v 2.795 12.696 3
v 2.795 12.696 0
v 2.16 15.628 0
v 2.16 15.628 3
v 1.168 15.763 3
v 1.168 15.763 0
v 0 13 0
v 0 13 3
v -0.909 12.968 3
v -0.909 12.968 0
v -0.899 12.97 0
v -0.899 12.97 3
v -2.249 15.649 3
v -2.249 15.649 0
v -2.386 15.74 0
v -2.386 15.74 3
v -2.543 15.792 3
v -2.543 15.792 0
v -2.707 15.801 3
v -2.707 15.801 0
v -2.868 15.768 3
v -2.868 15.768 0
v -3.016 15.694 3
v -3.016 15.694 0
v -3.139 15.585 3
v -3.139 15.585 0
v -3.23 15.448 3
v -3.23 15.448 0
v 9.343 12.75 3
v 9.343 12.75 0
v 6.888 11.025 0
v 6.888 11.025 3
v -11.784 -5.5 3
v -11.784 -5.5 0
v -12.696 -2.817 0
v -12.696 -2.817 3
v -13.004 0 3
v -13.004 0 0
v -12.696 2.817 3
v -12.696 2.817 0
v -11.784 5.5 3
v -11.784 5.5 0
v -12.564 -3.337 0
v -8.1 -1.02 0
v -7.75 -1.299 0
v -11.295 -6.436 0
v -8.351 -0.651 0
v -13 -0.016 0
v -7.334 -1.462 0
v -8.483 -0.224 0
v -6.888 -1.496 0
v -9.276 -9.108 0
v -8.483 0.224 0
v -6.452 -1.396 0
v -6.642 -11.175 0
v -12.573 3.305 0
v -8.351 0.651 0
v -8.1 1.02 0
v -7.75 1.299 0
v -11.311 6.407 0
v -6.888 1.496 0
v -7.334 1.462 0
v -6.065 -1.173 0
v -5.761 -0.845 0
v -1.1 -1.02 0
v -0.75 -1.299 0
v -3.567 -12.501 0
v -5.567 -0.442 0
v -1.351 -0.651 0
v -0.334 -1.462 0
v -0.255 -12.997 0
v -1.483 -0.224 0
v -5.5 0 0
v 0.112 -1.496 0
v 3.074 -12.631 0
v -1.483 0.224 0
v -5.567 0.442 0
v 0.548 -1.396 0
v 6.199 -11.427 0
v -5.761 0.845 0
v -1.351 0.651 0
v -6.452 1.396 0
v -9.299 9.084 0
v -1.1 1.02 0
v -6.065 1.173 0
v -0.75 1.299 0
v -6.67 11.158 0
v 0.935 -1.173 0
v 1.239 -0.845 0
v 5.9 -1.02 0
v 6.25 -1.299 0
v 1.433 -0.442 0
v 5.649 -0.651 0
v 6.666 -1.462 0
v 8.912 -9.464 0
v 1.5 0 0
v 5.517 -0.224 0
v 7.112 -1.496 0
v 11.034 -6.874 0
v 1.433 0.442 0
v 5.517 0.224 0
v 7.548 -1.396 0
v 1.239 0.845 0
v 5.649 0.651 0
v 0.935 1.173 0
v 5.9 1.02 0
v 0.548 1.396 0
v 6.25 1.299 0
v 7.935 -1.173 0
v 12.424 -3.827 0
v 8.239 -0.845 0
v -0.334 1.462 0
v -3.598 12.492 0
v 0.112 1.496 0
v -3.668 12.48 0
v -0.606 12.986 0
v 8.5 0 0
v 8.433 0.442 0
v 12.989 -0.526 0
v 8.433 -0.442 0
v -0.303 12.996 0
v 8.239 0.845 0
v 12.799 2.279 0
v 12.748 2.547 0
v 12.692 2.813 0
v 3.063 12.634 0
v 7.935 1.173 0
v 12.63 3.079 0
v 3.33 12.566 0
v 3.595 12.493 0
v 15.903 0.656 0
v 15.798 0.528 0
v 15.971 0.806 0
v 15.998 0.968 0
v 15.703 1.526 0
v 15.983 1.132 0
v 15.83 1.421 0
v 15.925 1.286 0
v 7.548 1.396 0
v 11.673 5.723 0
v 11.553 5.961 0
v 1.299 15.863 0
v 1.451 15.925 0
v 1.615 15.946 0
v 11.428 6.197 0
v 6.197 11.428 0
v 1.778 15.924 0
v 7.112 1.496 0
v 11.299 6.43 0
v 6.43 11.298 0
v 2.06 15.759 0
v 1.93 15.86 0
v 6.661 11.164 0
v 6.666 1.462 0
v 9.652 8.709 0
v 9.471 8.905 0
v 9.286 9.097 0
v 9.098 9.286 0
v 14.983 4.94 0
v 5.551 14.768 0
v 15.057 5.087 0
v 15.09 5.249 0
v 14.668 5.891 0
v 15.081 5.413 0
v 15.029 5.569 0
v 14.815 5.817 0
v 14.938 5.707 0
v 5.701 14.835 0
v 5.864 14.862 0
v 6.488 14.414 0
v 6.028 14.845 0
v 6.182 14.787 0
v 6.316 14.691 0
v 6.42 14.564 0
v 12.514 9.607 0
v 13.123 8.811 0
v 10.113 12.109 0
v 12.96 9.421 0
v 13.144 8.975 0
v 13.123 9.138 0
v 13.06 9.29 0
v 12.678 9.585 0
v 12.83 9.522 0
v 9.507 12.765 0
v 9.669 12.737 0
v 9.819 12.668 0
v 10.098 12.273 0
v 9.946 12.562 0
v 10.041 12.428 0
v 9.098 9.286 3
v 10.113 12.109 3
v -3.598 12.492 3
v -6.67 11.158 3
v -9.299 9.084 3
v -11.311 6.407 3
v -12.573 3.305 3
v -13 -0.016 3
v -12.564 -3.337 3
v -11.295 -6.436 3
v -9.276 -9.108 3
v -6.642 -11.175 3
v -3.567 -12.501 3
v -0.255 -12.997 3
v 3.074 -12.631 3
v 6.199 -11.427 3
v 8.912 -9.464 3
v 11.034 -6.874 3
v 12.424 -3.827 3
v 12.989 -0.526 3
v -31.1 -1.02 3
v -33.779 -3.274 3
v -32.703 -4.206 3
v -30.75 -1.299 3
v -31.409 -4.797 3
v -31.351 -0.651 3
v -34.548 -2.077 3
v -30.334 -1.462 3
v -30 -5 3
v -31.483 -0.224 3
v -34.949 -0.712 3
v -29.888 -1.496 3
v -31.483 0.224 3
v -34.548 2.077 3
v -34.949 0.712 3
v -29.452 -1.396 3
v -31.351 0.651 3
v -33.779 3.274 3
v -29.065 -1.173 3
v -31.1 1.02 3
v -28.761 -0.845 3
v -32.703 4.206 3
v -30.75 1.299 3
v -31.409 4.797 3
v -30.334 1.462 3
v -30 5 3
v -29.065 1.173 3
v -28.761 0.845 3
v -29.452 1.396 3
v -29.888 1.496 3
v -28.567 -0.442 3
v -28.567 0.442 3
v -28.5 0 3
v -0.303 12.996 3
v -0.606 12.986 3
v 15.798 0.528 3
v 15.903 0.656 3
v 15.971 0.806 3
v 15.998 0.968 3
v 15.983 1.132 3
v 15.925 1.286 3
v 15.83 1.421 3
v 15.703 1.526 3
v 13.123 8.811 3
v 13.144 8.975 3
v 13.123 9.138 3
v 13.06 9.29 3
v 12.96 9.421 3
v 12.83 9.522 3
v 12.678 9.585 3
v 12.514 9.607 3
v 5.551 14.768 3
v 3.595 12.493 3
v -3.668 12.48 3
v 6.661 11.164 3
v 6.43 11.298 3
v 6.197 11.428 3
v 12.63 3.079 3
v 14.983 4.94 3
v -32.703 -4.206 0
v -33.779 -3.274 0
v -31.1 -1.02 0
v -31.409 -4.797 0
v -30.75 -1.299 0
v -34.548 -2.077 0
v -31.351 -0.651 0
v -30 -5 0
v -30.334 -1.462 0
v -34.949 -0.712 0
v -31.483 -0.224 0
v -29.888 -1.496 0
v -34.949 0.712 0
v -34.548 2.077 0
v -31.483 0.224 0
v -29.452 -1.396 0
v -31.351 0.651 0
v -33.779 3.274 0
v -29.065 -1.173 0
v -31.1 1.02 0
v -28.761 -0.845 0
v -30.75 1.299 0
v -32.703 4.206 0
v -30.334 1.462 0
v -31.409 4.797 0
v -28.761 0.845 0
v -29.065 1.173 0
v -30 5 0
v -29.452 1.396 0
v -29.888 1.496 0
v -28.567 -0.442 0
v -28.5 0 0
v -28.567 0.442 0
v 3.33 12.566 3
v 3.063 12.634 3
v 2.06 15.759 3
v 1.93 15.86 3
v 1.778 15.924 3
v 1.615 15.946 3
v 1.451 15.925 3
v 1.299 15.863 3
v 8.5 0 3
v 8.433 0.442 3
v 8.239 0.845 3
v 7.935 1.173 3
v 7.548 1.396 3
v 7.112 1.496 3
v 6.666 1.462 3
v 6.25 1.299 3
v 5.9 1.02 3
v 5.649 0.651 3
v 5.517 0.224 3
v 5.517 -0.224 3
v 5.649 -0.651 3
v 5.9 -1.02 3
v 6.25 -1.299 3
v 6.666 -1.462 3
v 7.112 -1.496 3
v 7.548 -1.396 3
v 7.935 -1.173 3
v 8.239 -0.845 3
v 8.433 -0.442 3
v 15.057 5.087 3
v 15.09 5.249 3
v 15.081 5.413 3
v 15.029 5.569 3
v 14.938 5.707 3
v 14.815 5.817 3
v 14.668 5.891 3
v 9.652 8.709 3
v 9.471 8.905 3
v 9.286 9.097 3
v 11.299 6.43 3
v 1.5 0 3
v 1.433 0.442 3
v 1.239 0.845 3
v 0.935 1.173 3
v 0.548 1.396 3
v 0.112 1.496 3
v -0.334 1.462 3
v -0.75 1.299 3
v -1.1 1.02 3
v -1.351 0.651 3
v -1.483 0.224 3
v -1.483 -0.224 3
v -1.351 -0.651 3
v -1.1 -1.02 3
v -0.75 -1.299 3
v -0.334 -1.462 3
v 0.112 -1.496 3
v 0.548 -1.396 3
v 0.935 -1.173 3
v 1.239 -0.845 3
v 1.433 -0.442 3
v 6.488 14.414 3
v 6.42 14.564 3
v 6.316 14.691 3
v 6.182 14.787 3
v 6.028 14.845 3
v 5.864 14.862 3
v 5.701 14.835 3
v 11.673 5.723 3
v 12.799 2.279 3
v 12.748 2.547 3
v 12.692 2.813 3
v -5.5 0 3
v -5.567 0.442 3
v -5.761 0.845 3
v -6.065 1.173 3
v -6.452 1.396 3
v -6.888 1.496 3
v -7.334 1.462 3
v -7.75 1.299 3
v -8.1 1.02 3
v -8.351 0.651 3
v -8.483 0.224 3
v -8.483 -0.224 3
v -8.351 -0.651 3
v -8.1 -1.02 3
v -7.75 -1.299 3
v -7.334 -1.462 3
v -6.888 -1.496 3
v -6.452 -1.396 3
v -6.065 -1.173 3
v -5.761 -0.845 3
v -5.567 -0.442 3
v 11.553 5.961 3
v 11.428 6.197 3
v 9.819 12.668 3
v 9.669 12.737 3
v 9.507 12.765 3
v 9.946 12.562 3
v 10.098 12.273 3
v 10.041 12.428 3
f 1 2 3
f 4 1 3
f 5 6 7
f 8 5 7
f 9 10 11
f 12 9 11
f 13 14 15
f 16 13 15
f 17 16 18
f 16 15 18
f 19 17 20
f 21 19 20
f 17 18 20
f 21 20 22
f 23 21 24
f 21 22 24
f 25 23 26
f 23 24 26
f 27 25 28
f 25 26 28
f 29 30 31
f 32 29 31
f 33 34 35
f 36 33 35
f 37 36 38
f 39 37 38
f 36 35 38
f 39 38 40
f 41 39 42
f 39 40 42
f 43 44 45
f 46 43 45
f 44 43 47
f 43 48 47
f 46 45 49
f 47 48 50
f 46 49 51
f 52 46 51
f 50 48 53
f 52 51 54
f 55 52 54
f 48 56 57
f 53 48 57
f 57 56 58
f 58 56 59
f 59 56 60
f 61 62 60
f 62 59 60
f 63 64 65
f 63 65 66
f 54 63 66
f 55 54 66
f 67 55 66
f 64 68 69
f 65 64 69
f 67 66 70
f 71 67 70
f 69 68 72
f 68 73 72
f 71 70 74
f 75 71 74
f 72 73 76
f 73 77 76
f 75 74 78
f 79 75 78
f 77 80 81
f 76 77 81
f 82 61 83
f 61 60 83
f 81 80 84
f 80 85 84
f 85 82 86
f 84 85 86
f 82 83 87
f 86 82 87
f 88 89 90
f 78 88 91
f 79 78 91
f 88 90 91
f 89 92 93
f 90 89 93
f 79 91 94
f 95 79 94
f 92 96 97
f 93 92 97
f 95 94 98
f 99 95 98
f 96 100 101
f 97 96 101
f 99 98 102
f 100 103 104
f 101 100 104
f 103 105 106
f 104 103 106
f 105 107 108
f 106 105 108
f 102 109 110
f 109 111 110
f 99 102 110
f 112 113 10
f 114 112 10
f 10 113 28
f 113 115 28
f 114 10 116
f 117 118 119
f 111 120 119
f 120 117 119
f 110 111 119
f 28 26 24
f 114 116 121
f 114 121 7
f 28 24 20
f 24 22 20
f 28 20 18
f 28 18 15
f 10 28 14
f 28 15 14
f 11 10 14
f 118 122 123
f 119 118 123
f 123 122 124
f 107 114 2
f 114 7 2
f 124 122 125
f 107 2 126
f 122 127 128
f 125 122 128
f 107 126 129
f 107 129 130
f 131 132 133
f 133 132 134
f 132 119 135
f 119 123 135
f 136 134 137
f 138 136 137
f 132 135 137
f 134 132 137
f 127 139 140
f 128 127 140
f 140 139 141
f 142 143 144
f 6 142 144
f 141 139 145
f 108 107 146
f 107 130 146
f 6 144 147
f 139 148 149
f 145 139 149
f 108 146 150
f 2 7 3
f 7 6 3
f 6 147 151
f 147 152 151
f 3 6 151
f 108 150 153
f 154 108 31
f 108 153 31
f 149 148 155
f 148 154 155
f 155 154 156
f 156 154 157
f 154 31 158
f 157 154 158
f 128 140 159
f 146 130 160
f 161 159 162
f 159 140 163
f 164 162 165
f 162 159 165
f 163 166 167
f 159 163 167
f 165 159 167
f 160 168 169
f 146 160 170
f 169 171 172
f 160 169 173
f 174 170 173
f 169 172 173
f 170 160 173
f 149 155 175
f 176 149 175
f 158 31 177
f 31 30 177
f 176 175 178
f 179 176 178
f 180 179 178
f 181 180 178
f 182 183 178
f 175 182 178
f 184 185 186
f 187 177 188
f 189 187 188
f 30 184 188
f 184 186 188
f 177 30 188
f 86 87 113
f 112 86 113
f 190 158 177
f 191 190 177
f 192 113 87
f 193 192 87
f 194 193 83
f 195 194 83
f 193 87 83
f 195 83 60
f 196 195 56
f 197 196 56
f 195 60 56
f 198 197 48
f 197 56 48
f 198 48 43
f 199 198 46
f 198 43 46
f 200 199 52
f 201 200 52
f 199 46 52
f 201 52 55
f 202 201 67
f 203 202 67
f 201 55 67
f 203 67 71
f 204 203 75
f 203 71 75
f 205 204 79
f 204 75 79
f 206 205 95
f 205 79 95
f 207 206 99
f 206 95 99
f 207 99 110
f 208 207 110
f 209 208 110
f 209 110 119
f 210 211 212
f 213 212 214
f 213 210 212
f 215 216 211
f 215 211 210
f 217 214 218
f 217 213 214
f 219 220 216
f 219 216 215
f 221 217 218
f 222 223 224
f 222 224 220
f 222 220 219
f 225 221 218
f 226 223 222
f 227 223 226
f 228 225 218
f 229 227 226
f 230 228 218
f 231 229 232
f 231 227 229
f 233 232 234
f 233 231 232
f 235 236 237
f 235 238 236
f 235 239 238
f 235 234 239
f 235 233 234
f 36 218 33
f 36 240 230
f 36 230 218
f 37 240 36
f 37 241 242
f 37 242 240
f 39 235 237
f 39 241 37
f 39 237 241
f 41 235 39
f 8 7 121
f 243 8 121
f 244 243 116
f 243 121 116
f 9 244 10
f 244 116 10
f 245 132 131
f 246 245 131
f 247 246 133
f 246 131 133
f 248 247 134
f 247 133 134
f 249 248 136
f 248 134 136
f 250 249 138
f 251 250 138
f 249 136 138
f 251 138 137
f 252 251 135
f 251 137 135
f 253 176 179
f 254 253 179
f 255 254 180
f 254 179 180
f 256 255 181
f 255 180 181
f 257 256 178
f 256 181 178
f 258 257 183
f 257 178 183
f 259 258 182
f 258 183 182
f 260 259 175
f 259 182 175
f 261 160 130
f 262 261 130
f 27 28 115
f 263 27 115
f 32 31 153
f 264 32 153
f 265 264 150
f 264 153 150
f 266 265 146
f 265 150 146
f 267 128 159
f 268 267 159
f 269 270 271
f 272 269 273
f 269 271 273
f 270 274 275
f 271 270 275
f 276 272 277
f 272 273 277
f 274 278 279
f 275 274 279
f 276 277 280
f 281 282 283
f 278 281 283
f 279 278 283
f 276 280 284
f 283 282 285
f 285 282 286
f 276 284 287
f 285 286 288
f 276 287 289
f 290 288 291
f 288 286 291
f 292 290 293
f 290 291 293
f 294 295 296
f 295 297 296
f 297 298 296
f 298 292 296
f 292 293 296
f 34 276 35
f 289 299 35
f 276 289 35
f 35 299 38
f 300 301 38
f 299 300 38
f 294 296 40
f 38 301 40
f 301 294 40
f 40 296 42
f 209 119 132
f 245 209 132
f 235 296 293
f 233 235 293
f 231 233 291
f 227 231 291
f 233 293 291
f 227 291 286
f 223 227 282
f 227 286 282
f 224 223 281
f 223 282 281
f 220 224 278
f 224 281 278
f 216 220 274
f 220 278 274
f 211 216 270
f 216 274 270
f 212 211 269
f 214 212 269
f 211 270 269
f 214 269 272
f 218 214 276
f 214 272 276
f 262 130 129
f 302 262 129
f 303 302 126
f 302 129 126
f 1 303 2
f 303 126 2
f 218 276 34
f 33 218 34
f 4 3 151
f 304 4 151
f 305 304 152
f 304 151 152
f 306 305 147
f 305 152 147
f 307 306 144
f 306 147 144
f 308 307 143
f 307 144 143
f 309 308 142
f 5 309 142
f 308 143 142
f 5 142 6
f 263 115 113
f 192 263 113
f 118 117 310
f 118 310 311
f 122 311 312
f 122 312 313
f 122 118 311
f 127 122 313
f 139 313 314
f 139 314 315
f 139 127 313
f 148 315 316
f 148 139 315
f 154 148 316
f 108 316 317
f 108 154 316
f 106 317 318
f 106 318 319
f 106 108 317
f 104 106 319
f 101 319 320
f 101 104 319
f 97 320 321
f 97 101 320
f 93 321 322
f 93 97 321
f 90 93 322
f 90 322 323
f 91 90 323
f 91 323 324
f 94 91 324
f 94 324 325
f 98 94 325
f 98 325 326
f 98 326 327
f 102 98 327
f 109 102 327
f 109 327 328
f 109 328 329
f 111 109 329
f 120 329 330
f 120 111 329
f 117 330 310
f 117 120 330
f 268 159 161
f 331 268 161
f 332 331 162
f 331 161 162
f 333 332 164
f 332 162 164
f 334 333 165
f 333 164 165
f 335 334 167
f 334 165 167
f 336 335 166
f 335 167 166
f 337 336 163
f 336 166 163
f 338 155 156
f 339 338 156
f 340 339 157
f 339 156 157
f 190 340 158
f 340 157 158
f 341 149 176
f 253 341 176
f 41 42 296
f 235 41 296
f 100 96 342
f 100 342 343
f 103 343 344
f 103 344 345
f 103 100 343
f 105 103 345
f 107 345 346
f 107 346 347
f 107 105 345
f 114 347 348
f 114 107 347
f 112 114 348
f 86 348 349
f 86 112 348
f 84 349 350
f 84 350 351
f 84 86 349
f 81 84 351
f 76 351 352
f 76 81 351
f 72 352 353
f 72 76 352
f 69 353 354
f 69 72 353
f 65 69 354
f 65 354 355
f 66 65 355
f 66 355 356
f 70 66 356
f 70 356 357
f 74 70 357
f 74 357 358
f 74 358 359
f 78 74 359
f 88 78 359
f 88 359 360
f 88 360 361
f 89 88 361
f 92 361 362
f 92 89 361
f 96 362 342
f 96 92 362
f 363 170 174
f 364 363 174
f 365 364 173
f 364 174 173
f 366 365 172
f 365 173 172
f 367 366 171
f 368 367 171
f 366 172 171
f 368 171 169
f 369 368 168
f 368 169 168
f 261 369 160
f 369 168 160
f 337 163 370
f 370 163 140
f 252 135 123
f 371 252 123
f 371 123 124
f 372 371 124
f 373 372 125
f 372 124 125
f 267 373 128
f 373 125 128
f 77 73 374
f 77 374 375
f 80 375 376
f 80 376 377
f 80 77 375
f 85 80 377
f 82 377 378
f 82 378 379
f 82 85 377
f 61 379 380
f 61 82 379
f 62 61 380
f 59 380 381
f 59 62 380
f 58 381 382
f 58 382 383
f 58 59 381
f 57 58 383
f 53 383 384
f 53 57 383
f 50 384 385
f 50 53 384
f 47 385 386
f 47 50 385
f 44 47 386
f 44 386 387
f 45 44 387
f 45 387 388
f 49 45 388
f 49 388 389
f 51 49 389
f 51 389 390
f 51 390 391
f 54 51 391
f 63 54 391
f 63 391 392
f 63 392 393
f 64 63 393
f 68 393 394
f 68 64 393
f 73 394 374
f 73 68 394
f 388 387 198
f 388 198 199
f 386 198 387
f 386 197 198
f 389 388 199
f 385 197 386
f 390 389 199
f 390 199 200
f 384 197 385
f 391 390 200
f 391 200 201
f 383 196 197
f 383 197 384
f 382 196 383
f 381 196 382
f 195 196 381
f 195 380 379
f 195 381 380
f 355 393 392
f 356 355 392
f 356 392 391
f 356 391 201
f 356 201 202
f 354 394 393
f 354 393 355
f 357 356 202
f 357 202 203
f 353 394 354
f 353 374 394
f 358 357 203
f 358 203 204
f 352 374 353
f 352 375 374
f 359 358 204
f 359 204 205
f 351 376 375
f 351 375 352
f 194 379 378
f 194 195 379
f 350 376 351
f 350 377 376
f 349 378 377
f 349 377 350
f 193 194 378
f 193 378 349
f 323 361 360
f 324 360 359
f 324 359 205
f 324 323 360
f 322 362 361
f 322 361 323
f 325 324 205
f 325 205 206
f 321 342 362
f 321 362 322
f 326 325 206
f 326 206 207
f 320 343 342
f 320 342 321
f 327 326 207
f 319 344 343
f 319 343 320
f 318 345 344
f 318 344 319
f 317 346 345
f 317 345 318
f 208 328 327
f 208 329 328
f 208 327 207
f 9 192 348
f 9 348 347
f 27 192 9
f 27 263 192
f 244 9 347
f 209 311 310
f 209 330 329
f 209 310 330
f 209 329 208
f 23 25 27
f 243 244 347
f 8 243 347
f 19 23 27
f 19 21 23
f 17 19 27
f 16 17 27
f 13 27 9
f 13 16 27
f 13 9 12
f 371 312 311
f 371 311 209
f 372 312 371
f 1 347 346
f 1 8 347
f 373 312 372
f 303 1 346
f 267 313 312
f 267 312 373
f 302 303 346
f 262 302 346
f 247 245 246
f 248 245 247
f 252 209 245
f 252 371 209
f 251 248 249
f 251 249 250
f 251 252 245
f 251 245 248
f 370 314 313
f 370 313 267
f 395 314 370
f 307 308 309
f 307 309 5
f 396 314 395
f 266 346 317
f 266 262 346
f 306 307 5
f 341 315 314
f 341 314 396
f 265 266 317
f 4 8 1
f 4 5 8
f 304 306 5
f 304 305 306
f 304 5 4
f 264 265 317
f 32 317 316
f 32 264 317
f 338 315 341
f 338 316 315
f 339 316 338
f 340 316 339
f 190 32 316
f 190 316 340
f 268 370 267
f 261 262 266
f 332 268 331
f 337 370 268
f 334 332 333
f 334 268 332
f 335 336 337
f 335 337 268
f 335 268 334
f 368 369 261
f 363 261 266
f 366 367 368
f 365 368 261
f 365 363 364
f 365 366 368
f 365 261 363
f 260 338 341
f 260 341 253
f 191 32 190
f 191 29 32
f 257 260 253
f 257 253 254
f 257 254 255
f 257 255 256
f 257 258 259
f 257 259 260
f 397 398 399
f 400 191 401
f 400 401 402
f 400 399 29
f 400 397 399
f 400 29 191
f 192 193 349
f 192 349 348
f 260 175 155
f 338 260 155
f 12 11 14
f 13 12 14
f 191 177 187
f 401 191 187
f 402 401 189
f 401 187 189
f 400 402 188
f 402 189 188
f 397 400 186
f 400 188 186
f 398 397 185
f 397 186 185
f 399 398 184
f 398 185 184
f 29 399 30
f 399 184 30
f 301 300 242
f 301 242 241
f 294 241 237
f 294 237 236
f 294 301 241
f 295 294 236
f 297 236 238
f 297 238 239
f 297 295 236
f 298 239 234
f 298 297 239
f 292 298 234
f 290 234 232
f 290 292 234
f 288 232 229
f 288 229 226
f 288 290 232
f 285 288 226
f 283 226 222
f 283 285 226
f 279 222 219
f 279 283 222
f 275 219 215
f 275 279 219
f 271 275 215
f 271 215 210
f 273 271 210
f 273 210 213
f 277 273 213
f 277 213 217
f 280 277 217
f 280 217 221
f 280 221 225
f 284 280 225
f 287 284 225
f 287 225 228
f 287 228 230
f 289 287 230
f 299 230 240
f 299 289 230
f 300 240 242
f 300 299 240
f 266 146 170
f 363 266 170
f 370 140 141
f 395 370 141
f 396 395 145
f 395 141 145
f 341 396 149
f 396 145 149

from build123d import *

# Parameters (mm, degrees)
SCHIZZO1_R                   = 13
SCHIZZO1_R_2                 = 1.5
ESTRUSIONE_ESTRUSIONE1_DEPTH = 3
SCHIZZO2_R                   = 1.5
ESTRUSIONE_ESTRUSIONE2_DEPTH = 3
ESTRUSIONE_ESTRUSIONE3_DEPTH = 3


with BuildPart() as part:
    # Schizzo1 → Estrusione-Estrusione1 (new body)
    with BuildSketch(Plane.XY):
        Circle(SCHIZZO1_R)
        with Locations((-7, 0)):
            Circle(SCHIZZO1_R_2, mode=Mode.SUBTRACT)
        with Locations((7, 0)):
            Circle(SCHIZZO1_R_2, mode=Mode.SUBTRACT)
        Circle(SCHIZZO1_R_2, mode=Mode.SUBTRACT)
    extrude(amount=ESTRUSIONE_ESTRUSIONE1_DEPTH)

    # Schizzo3 → Estrusione-Estrusione3 (add)
    with BuildSketch(Plane.XY):
        with BuildLine():
            ThreePointArc((2.160070392, 15.627933395), (1.697201955, 15.940072625), (1.16759145, 15.763463444))
            Line((1.16759145, 15.763463444), (0, 13))
            ThreePointArc((0, 13), (1.40584798, 12.923760732), (2.795206602, 12.695937147))
            Line((2.795206602, 12.695937147), (2.160070392, 15.627933395))
        make_face()
        with BuildLine():
            ThreePointArc((-3.598471304, 12.492037635), (-2.266143189, 12.800960708), (-0.908732869, 12.968199743))
            Line((-0.908732869, 12.968199743), (-0.898912385, 12.969938255))
            Line((-0.898912385, 12.969938255), (-2.248522058, 15.649220571))
            ThreePointArc((-2.248522058, 15.649220571), (-2.78874852, 15.790051886), (-3.229728761, 15.44768583))
            Line((-3.229728761, 15.44768583), (-3.667559269, 12.479807051))
            Line((-3.667559269, 12.479807051), (-3.598471304, 12.492037635))
        make_face()
        with BuildLine():
            Line((5.551256778, 14.767591357), (3.595206602, 12.492977607))
            ThreePointArc((3.595206602, 12.492977607), (4.925139788, 12.030918422), (6.197305427, 11.427747173))
            Line((6.197305427, 11.427747173), (6.488312128, 14.413599664))
            ThreePointArc((6.488312128, 14.413599664), (6.106946442, 14.821322981), (5.551256778, 14.767591357))
        make_face()
        with BuildLine():
            ThreePointArc((12.798690895, 2.278927679), (12.970080361, 0.881484793), (12.989342221, -0.526297133))
            Line((12.989342221, -0.526297133), (15.79780933, 0.528459946))
            ThreePointArc((15.79780933, 0.528459946), (15.995714682, 1.050486345), (15.702570302, 1.525612078))
            Line((15.702570302, 1.525612078), (12.798690895, 2.278927679))
        make_face()
        with BuildLine():
            Line((9.342997115, 12.74984135), (6.888483888, 11.024916768))
            ThreePointArc((6.888483888, 11.024916768), (8.040344195, 10.215325018), (9.097898355, 9.285916515))
            Line((9.097898355, 9.285916515), (10.112874129, 12.109004218))
            ThreePointArc((10.112874129, 12.109004218), (9.885726441, 12.618986587), (9.342997115, 12.74984135))
        make_face()
        with BuildLine():
            Line((12.514244156, 9.60686731), (9.651842013, 8.708728137))
            ThreePointArc((9.651842013, 8.708728137), (10.53701882, 7.613884317), (11.298605688, 6.429736349))
            Line((11.298605688, 6.429736349), (13.122911734, 8.811313022))
            ThreePointArc((13.122911734, 8.811313022), (13.014464163, 9.358960001), (12.514244156, 9.60686731))
        make_face()
        with BuildLine():
            ThreePointArc((11.672700614, 5.722592102), (12.223098799, 4.426720655), (12.630130813, 3.078927679))
            Line((12.630130813, 3.078927679), (14.983183808, 4.939879478))
            ThreePointArc((14.983183808, 4.939879478), (15.059699232, 5.49289257), (14.667987618, 5.890686613))
            Line((14.667987618, 5.890686613), (11.672700614, 5.722592102))
        make_face()
    extrude(amount=ESTRUSIONE_ESTRUSIONE3_DEPTH)


with BuildPart() as body_2:
    # Schizzo2 → Estrusione-Estrusione2 (new body)
    with BuildSketch(Plane.XY):
        with BuildLine():
            Line((-11.784238345, 5.499862263), (-30, 5))
            ThreePointArc((-30, 5), (-35, 0), (-30, -5))
            Line((-30, -5), (-11.784238345, -5.499862263))
            ThreePointArc((-11.784238345, -5.499862263), (-13.004489928, 0), (-11.784238345, 5.499862263))
        make_face()
        with Locations((-30, 0)):
            Circle(SCHIZZO2_R, mode=Mode.SUBTRACT)
    extrude(amount=ESTRUSIONE_ESTRUSIONE2_DEPTH)


solid = Compound([part.part, body_2.part])
